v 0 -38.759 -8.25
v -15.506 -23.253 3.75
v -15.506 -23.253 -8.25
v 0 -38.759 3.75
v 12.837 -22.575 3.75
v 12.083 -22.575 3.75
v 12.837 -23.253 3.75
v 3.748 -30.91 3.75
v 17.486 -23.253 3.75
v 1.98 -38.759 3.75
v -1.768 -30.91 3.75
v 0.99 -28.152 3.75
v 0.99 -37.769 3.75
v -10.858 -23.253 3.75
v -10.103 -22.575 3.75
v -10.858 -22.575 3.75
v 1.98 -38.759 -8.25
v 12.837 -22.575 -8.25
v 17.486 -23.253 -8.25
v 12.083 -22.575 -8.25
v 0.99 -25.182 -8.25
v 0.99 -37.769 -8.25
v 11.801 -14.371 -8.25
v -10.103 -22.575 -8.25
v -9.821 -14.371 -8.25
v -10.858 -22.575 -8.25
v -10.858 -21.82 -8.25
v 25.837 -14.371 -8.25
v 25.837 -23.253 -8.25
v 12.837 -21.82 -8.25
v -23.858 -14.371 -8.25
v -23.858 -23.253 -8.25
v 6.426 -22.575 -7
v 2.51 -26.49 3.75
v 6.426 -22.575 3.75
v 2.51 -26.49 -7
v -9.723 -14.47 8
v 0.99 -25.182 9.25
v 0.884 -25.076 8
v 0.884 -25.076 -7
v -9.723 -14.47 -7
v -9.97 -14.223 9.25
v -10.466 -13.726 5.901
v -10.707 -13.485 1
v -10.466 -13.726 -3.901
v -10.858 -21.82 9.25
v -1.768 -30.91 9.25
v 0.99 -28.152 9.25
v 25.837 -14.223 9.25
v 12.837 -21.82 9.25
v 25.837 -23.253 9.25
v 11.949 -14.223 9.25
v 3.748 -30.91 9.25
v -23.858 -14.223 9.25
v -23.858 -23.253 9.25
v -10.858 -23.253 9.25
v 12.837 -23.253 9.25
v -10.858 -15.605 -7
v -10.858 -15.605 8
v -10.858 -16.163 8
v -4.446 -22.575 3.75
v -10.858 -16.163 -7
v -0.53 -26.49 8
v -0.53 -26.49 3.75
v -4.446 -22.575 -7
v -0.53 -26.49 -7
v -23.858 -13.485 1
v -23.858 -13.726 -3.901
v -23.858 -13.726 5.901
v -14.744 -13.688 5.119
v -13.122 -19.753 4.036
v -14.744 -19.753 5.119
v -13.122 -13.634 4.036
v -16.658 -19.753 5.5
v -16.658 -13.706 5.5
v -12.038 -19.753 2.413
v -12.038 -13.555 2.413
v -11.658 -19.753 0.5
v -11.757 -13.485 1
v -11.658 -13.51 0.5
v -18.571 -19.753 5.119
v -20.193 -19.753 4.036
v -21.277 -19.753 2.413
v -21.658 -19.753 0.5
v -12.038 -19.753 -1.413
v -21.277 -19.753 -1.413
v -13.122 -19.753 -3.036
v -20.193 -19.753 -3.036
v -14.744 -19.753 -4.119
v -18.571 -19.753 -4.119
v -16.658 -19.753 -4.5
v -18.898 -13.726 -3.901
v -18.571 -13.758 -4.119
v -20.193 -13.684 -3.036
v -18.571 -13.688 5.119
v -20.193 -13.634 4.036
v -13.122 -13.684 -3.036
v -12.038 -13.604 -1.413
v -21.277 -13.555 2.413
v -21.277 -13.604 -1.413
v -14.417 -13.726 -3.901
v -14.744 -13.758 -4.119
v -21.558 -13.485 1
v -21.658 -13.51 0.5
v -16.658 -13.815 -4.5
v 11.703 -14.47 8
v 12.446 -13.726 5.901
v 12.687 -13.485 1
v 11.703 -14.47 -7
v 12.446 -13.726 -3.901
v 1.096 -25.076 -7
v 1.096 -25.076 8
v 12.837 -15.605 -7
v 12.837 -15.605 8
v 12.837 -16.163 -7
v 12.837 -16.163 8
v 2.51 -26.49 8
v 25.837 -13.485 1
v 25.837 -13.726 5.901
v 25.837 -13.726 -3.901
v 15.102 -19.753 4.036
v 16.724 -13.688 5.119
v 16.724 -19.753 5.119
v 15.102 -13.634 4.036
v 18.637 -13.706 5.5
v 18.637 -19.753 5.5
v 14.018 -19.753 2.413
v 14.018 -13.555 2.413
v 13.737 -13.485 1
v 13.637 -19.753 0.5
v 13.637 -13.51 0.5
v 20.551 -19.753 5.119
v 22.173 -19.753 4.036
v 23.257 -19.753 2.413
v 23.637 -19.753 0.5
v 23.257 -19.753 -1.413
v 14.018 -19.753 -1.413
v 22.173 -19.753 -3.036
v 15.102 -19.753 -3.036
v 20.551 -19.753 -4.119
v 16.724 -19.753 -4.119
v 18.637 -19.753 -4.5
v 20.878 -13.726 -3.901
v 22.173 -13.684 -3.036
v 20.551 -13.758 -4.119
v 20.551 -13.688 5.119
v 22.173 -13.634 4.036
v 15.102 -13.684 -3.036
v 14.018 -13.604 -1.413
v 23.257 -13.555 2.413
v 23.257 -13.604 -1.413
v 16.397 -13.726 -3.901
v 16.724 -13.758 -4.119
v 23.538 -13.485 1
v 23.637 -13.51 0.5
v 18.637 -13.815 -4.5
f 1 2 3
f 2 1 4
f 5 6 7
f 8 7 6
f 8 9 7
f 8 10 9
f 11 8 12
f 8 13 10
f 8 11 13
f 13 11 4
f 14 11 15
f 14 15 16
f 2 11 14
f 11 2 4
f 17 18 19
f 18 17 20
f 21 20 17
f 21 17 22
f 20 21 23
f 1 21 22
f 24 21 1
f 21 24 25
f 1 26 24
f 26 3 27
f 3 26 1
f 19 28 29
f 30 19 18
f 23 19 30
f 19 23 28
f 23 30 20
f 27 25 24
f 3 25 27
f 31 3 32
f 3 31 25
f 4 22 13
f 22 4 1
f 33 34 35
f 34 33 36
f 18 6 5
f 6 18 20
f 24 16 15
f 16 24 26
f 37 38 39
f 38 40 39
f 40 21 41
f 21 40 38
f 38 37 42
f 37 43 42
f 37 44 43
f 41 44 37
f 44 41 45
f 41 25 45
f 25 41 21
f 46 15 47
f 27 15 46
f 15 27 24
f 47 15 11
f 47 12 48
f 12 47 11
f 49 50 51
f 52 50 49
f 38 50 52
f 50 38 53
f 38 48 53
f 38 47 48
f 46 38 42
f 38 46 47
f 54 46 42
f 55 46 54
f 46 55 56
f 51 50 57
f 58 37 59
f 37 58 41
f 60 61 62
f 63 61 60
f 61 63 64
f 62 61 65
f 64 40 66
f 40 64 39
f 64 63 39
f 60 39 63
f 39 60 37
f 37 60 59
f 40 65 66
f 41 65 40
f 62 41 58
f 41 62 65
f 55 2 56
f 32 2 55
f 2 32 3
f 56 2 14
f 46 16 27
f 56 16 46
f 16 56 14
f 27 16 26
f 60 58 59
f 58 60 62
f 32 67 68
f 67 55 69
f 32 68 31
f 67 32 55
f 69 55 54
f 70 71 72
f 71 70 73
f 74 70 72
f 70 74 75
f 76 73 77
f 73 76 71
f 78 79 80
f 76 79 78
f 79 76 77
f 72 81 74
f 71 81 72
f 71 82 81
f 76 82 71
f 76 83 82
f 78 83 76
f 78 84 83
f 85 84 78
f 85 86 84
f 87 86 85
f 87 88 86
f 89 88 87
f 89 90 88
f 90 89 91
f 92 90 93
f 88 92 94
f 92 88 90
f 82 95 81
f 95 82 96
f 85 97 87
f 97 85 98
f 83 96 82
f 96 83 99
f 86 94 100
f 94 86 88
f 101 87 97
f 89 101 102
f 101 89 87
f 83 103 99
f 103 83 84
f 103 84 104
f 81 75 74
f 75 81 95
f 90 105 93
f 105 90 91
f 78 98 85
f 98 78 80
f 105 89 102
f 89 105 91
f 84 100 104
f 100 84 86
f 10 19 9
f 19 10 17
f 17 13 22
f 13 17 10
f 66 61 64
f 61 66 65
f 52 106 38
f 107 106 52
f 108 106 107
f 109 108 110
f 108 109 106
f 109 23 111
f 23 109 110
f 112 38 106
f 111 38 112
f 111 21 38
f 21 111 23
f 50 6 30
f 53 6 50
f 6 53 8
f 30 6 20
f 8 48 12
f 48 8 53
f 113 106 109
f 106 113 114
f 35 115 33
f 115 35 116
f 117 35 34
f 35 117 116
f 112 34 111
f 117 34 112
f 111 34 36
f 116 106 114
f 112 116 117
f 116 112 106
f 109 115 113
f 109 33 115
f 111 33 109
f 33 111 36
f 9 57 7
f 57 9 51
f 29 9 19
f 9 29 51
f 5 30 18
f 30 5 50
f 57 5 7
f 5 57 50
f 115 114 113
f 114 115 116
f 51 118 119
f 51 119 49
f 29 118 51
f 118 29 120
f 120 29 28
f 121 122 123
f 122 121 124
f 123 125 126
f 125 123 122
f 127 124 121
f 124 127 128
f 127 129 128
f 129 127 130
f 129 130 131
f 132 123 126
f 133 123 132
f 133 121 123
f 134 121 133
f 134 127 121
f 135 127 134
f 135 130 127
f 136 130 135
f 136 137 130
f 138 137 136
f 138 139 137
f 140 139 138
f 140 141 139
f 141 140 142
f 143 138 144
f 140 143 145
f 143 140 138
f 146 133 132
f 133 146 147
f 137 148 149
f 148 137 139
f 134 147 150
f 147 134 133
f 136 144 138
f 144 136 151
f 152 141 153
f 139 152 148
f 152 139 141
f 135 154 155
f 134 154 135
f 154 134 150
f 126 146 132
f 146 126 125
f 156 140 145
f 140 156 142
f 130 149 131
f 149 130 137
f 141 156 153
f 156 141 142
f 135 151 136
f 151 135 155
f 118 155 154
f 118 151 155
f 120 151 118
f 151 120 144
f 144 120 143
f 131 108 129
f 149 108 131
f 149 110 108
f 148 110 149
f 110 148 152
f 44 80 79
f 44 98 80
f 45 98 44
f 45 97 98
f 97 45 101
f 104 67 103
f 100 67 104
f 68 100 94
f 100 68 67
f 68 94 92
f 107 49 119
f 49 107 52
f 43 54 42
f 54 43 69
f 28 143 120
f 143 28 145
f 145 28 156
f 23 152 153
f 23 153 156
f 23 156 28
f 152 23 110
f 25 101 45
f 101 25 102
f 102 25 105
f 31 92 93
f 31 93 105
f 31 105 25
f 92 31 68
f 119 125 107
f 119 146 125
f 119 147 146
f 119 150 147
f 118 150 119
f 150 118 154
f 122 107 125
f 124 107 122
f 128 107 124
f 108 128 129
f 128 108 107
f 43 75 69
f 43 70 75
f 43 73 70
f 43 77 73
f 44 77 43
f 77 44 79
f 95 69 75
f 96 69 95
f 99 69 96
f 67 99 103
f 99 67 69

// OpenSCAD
// This is the size and shape of a stack of n nyodimium mags
mirrorside1 = 15;
mirrorside2 = 15;
mirrorthick = 2;

magradius = 5;
//magradius = 4.6; // sensor: slip-on oversized magradius
melexis = 4.8;   // digital temp sensor

magthick = 3;
nummagnets = 6;

module magnet(height)
{   cylinder(r=magradius,h=height,center=true); }

module mymirror(thick)
{ cube([mirrorside1,mirrorside2,mirrorthick],center=true); }

module magnetcup(n)
{
	height = nummagnets*1.0;
	cupside = 2*magradius + 4;
	difference() {
		translate([0,2.3,0])cube([mirrorside1+2.5,mirrorside2-2,height+4],center=true);
		translate([0,3,2])
          magnet(height+1); //bigger for subtraction
  }
}

module mirrorcup()
{	
  thick = 6;

 rotate([0,0,-90])
  difference() {
   cube([mirrorside1+4,mirrorside2+2.5,thick],center=true);
   translate([0.25,0,2]) 
      mymirror(thick+3); // thicker for subtraction

   translate([4+mirrorside1/2,0,2-mirrorside1])
   rotate([0,45,0])
     cube([mirrorside1+8,mirrorside1+8,mirrorside1+8],center=true);
 translate([8,0,-2]) 
    rotate([0,45,0]) cube([5,20,8],center=true);
}
}

module mirrorframe(thick)
{	
  difference() {
   cube([30,30,thick],center=true);
   translate([-6.9,-6.9,0]) 
      cube([30,30,thick+2],center=true);
   translate([-12,-12,0])
       rotate([0,0,45])
         cube([44,44,thick+2],center=true);
  }
}

module half() {

translate([1.8,1.8,-0.25]) mirrorframe(12);

translate([9.5,0.5,2.5]) 
   rotate([0,-90,0])
      mirrorcup();
translate([16.2,-11.6,2.5])
   rotate([0,-90,45])
      magnetcup(4);
}

module jarwall() {
  difference() {
     cube([40,40,120],center=true);
	  translate([40,0,0])
	     cylinder(r=50,h=120,center=true,$fn=64);
	   }
}
	
module assembly() {
	half();
   translate([-1.4,1.4,0])
    rotate([0,0,-90])
      mirror([1,0,0])
          half();
}

module mirrordevice() {

  difference() {
   assembly();
   translate([6,6,3]) rotate([90,0,45]) jarwall();
  }
}

module sensordevice() {
     translate([26,30,4]) cube([5,62,34],center=true);
     translate([-26,30,4]) cube([5,62,34],center=true);
     translate([0,31,19]) cube([48,60,4],center=true);
     translate([ 17,7,-4]) cube([12,2,12],center=true);
     translate([-17,7,-4]) cube([12,2,12],center=true);

difference() {
	  translate([0,0,4]) cube([48,20,34], center=true);
translate([0,0,-4]) union() {
     translate([17,0,0]) rotate([90,0,0]) magnet(22);
     translate([-17,0,0]) rotate([90,0,0]) magnet(22);
     translate([0,0,14]) rotate([90,0,0]) cylinder(r=melexis,h=30,center=true);

     translate([5,0,0]) rotate([90,0,0]) cylinder(r=3.2,h=30,center=true);
     translate([-5,0,0]) rotate([90,0,0]) cylinder(r=2.1,h=30,center=true);
	     translate([-5,-4,0]) rotate([90,0,0]) cylinder(r1=1,r2=9,h=18,center=true);
    
 //    translate([14,8,14]) rotate([90,0,0]) cylinder(r=1.4,h=10,center=true);
  //   translate([-14,8,14]) rotate([90,0,0]) cylinder(r=1.4,h=10,center=true);


	  translate([20,-52,0])
       rotate([0,90,0])
	     cylinder(r=50,h=120,center=true,$fn=64);
   } // end union
 }
}


//rotate([0,180,0]) sensordevice();
translate([0,-15,-2]) rotate([0,0,-135])
                  mirrordevice();
//mirrorcup();
//half();
//assembly();
